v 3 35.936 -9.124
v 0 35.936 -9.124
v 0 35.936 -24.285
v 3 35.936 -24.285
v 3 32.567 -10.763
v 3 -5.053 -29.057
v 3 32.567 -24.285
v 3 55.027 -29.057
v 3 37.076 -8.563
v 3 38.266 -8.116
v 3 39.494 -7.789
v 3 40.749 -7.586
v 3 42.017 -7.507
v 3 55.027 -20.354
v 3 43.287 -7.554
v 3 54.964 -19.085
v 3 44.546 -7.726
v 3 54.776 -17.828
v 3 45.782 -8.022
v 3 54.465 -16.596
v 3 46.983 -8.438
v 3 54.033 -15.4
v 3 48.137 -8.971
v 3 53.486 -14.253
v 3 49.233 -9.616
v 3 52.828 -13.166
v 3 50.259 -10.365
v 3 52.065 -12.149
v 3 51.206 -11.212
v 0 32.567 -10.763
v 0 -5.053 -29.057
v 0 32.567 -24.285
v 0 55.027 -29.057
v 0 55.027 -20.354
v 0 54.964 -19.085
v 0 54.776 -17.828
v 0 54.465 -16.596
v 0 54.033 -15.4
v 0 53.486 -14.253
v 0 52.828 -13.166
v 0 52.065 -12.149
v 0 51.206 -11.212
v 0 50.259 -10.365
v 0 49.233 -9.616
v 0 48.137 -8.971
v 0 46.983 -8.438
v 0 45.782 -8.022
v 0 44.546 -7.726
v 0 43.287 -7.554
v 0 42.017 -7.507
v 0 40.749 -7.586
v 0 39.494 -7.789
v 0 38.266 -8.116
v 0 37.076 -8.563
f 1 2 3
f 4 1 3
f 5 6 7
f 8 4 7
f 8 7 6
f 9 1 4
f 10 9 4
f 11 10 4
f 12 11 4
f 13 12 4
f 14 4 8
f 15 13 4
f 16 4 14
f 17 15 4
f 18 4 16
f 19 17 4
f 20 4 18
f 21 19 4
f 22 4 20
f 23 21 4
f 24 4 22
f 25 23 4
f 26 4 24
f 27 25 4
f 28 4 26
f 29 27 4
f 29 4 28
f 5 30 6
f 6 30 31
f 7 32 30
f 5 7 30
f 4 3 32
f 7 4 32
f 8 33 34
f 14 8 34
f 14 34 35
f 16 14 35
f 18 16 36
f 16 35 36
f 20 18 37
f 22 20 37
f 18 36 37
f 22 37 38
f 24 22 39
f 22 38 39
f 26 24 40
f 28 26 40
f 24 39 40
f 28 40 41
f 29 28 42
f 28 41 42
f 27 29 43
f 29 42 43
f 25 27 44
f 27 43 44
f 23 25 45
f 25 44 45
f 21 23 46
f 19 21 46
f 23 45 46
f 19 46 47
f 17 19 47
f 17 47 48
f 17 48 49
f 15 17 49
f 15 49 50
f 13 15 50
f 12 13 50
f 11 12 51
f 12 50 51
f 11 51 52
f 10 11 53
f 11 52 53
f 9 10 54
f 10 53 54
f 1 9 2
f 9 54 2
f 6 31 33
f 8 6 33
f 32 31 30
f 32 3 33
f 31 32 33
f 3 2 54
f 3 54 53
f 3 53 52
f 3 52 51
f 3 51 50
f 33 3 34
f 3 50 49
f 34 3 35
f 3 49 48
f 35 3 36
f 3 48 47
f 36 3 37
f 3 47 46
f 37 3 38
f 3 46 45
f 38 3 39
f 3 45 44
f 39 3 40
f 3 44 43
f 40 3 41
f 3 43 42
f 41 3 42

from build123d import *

# Parameters (mm, degrees)
F1_DEPTH = 3


with BuildPart() as f1:
    # F0 (on Right) → F1 (new body)
    with BuildSketch(Plane.YZ):
        with BuildLine():
            Line((-5.053473, -29.057488), (55.02674, -29.057488))
            Line((55.02674, -29.057488), (55.02674, -20.354279))
            ThreePointArc((55.02674, -20.354279), (48.692747, -9.279821), (35.93583, -9.124332))
            Line((35.93583, -9.124332), (35.93583, -24.28476))
            Line((35.93583, -24.28476), (32.566845, -24.28476))
            Line((32.566845, -24.28476), (32.566845, -10.762674))
            Line((32.566845, -10.762674), (-5.053473, -29.057488))
        make_face()
    extrude(amount=F1_DEPTH)


solid = f1.part
